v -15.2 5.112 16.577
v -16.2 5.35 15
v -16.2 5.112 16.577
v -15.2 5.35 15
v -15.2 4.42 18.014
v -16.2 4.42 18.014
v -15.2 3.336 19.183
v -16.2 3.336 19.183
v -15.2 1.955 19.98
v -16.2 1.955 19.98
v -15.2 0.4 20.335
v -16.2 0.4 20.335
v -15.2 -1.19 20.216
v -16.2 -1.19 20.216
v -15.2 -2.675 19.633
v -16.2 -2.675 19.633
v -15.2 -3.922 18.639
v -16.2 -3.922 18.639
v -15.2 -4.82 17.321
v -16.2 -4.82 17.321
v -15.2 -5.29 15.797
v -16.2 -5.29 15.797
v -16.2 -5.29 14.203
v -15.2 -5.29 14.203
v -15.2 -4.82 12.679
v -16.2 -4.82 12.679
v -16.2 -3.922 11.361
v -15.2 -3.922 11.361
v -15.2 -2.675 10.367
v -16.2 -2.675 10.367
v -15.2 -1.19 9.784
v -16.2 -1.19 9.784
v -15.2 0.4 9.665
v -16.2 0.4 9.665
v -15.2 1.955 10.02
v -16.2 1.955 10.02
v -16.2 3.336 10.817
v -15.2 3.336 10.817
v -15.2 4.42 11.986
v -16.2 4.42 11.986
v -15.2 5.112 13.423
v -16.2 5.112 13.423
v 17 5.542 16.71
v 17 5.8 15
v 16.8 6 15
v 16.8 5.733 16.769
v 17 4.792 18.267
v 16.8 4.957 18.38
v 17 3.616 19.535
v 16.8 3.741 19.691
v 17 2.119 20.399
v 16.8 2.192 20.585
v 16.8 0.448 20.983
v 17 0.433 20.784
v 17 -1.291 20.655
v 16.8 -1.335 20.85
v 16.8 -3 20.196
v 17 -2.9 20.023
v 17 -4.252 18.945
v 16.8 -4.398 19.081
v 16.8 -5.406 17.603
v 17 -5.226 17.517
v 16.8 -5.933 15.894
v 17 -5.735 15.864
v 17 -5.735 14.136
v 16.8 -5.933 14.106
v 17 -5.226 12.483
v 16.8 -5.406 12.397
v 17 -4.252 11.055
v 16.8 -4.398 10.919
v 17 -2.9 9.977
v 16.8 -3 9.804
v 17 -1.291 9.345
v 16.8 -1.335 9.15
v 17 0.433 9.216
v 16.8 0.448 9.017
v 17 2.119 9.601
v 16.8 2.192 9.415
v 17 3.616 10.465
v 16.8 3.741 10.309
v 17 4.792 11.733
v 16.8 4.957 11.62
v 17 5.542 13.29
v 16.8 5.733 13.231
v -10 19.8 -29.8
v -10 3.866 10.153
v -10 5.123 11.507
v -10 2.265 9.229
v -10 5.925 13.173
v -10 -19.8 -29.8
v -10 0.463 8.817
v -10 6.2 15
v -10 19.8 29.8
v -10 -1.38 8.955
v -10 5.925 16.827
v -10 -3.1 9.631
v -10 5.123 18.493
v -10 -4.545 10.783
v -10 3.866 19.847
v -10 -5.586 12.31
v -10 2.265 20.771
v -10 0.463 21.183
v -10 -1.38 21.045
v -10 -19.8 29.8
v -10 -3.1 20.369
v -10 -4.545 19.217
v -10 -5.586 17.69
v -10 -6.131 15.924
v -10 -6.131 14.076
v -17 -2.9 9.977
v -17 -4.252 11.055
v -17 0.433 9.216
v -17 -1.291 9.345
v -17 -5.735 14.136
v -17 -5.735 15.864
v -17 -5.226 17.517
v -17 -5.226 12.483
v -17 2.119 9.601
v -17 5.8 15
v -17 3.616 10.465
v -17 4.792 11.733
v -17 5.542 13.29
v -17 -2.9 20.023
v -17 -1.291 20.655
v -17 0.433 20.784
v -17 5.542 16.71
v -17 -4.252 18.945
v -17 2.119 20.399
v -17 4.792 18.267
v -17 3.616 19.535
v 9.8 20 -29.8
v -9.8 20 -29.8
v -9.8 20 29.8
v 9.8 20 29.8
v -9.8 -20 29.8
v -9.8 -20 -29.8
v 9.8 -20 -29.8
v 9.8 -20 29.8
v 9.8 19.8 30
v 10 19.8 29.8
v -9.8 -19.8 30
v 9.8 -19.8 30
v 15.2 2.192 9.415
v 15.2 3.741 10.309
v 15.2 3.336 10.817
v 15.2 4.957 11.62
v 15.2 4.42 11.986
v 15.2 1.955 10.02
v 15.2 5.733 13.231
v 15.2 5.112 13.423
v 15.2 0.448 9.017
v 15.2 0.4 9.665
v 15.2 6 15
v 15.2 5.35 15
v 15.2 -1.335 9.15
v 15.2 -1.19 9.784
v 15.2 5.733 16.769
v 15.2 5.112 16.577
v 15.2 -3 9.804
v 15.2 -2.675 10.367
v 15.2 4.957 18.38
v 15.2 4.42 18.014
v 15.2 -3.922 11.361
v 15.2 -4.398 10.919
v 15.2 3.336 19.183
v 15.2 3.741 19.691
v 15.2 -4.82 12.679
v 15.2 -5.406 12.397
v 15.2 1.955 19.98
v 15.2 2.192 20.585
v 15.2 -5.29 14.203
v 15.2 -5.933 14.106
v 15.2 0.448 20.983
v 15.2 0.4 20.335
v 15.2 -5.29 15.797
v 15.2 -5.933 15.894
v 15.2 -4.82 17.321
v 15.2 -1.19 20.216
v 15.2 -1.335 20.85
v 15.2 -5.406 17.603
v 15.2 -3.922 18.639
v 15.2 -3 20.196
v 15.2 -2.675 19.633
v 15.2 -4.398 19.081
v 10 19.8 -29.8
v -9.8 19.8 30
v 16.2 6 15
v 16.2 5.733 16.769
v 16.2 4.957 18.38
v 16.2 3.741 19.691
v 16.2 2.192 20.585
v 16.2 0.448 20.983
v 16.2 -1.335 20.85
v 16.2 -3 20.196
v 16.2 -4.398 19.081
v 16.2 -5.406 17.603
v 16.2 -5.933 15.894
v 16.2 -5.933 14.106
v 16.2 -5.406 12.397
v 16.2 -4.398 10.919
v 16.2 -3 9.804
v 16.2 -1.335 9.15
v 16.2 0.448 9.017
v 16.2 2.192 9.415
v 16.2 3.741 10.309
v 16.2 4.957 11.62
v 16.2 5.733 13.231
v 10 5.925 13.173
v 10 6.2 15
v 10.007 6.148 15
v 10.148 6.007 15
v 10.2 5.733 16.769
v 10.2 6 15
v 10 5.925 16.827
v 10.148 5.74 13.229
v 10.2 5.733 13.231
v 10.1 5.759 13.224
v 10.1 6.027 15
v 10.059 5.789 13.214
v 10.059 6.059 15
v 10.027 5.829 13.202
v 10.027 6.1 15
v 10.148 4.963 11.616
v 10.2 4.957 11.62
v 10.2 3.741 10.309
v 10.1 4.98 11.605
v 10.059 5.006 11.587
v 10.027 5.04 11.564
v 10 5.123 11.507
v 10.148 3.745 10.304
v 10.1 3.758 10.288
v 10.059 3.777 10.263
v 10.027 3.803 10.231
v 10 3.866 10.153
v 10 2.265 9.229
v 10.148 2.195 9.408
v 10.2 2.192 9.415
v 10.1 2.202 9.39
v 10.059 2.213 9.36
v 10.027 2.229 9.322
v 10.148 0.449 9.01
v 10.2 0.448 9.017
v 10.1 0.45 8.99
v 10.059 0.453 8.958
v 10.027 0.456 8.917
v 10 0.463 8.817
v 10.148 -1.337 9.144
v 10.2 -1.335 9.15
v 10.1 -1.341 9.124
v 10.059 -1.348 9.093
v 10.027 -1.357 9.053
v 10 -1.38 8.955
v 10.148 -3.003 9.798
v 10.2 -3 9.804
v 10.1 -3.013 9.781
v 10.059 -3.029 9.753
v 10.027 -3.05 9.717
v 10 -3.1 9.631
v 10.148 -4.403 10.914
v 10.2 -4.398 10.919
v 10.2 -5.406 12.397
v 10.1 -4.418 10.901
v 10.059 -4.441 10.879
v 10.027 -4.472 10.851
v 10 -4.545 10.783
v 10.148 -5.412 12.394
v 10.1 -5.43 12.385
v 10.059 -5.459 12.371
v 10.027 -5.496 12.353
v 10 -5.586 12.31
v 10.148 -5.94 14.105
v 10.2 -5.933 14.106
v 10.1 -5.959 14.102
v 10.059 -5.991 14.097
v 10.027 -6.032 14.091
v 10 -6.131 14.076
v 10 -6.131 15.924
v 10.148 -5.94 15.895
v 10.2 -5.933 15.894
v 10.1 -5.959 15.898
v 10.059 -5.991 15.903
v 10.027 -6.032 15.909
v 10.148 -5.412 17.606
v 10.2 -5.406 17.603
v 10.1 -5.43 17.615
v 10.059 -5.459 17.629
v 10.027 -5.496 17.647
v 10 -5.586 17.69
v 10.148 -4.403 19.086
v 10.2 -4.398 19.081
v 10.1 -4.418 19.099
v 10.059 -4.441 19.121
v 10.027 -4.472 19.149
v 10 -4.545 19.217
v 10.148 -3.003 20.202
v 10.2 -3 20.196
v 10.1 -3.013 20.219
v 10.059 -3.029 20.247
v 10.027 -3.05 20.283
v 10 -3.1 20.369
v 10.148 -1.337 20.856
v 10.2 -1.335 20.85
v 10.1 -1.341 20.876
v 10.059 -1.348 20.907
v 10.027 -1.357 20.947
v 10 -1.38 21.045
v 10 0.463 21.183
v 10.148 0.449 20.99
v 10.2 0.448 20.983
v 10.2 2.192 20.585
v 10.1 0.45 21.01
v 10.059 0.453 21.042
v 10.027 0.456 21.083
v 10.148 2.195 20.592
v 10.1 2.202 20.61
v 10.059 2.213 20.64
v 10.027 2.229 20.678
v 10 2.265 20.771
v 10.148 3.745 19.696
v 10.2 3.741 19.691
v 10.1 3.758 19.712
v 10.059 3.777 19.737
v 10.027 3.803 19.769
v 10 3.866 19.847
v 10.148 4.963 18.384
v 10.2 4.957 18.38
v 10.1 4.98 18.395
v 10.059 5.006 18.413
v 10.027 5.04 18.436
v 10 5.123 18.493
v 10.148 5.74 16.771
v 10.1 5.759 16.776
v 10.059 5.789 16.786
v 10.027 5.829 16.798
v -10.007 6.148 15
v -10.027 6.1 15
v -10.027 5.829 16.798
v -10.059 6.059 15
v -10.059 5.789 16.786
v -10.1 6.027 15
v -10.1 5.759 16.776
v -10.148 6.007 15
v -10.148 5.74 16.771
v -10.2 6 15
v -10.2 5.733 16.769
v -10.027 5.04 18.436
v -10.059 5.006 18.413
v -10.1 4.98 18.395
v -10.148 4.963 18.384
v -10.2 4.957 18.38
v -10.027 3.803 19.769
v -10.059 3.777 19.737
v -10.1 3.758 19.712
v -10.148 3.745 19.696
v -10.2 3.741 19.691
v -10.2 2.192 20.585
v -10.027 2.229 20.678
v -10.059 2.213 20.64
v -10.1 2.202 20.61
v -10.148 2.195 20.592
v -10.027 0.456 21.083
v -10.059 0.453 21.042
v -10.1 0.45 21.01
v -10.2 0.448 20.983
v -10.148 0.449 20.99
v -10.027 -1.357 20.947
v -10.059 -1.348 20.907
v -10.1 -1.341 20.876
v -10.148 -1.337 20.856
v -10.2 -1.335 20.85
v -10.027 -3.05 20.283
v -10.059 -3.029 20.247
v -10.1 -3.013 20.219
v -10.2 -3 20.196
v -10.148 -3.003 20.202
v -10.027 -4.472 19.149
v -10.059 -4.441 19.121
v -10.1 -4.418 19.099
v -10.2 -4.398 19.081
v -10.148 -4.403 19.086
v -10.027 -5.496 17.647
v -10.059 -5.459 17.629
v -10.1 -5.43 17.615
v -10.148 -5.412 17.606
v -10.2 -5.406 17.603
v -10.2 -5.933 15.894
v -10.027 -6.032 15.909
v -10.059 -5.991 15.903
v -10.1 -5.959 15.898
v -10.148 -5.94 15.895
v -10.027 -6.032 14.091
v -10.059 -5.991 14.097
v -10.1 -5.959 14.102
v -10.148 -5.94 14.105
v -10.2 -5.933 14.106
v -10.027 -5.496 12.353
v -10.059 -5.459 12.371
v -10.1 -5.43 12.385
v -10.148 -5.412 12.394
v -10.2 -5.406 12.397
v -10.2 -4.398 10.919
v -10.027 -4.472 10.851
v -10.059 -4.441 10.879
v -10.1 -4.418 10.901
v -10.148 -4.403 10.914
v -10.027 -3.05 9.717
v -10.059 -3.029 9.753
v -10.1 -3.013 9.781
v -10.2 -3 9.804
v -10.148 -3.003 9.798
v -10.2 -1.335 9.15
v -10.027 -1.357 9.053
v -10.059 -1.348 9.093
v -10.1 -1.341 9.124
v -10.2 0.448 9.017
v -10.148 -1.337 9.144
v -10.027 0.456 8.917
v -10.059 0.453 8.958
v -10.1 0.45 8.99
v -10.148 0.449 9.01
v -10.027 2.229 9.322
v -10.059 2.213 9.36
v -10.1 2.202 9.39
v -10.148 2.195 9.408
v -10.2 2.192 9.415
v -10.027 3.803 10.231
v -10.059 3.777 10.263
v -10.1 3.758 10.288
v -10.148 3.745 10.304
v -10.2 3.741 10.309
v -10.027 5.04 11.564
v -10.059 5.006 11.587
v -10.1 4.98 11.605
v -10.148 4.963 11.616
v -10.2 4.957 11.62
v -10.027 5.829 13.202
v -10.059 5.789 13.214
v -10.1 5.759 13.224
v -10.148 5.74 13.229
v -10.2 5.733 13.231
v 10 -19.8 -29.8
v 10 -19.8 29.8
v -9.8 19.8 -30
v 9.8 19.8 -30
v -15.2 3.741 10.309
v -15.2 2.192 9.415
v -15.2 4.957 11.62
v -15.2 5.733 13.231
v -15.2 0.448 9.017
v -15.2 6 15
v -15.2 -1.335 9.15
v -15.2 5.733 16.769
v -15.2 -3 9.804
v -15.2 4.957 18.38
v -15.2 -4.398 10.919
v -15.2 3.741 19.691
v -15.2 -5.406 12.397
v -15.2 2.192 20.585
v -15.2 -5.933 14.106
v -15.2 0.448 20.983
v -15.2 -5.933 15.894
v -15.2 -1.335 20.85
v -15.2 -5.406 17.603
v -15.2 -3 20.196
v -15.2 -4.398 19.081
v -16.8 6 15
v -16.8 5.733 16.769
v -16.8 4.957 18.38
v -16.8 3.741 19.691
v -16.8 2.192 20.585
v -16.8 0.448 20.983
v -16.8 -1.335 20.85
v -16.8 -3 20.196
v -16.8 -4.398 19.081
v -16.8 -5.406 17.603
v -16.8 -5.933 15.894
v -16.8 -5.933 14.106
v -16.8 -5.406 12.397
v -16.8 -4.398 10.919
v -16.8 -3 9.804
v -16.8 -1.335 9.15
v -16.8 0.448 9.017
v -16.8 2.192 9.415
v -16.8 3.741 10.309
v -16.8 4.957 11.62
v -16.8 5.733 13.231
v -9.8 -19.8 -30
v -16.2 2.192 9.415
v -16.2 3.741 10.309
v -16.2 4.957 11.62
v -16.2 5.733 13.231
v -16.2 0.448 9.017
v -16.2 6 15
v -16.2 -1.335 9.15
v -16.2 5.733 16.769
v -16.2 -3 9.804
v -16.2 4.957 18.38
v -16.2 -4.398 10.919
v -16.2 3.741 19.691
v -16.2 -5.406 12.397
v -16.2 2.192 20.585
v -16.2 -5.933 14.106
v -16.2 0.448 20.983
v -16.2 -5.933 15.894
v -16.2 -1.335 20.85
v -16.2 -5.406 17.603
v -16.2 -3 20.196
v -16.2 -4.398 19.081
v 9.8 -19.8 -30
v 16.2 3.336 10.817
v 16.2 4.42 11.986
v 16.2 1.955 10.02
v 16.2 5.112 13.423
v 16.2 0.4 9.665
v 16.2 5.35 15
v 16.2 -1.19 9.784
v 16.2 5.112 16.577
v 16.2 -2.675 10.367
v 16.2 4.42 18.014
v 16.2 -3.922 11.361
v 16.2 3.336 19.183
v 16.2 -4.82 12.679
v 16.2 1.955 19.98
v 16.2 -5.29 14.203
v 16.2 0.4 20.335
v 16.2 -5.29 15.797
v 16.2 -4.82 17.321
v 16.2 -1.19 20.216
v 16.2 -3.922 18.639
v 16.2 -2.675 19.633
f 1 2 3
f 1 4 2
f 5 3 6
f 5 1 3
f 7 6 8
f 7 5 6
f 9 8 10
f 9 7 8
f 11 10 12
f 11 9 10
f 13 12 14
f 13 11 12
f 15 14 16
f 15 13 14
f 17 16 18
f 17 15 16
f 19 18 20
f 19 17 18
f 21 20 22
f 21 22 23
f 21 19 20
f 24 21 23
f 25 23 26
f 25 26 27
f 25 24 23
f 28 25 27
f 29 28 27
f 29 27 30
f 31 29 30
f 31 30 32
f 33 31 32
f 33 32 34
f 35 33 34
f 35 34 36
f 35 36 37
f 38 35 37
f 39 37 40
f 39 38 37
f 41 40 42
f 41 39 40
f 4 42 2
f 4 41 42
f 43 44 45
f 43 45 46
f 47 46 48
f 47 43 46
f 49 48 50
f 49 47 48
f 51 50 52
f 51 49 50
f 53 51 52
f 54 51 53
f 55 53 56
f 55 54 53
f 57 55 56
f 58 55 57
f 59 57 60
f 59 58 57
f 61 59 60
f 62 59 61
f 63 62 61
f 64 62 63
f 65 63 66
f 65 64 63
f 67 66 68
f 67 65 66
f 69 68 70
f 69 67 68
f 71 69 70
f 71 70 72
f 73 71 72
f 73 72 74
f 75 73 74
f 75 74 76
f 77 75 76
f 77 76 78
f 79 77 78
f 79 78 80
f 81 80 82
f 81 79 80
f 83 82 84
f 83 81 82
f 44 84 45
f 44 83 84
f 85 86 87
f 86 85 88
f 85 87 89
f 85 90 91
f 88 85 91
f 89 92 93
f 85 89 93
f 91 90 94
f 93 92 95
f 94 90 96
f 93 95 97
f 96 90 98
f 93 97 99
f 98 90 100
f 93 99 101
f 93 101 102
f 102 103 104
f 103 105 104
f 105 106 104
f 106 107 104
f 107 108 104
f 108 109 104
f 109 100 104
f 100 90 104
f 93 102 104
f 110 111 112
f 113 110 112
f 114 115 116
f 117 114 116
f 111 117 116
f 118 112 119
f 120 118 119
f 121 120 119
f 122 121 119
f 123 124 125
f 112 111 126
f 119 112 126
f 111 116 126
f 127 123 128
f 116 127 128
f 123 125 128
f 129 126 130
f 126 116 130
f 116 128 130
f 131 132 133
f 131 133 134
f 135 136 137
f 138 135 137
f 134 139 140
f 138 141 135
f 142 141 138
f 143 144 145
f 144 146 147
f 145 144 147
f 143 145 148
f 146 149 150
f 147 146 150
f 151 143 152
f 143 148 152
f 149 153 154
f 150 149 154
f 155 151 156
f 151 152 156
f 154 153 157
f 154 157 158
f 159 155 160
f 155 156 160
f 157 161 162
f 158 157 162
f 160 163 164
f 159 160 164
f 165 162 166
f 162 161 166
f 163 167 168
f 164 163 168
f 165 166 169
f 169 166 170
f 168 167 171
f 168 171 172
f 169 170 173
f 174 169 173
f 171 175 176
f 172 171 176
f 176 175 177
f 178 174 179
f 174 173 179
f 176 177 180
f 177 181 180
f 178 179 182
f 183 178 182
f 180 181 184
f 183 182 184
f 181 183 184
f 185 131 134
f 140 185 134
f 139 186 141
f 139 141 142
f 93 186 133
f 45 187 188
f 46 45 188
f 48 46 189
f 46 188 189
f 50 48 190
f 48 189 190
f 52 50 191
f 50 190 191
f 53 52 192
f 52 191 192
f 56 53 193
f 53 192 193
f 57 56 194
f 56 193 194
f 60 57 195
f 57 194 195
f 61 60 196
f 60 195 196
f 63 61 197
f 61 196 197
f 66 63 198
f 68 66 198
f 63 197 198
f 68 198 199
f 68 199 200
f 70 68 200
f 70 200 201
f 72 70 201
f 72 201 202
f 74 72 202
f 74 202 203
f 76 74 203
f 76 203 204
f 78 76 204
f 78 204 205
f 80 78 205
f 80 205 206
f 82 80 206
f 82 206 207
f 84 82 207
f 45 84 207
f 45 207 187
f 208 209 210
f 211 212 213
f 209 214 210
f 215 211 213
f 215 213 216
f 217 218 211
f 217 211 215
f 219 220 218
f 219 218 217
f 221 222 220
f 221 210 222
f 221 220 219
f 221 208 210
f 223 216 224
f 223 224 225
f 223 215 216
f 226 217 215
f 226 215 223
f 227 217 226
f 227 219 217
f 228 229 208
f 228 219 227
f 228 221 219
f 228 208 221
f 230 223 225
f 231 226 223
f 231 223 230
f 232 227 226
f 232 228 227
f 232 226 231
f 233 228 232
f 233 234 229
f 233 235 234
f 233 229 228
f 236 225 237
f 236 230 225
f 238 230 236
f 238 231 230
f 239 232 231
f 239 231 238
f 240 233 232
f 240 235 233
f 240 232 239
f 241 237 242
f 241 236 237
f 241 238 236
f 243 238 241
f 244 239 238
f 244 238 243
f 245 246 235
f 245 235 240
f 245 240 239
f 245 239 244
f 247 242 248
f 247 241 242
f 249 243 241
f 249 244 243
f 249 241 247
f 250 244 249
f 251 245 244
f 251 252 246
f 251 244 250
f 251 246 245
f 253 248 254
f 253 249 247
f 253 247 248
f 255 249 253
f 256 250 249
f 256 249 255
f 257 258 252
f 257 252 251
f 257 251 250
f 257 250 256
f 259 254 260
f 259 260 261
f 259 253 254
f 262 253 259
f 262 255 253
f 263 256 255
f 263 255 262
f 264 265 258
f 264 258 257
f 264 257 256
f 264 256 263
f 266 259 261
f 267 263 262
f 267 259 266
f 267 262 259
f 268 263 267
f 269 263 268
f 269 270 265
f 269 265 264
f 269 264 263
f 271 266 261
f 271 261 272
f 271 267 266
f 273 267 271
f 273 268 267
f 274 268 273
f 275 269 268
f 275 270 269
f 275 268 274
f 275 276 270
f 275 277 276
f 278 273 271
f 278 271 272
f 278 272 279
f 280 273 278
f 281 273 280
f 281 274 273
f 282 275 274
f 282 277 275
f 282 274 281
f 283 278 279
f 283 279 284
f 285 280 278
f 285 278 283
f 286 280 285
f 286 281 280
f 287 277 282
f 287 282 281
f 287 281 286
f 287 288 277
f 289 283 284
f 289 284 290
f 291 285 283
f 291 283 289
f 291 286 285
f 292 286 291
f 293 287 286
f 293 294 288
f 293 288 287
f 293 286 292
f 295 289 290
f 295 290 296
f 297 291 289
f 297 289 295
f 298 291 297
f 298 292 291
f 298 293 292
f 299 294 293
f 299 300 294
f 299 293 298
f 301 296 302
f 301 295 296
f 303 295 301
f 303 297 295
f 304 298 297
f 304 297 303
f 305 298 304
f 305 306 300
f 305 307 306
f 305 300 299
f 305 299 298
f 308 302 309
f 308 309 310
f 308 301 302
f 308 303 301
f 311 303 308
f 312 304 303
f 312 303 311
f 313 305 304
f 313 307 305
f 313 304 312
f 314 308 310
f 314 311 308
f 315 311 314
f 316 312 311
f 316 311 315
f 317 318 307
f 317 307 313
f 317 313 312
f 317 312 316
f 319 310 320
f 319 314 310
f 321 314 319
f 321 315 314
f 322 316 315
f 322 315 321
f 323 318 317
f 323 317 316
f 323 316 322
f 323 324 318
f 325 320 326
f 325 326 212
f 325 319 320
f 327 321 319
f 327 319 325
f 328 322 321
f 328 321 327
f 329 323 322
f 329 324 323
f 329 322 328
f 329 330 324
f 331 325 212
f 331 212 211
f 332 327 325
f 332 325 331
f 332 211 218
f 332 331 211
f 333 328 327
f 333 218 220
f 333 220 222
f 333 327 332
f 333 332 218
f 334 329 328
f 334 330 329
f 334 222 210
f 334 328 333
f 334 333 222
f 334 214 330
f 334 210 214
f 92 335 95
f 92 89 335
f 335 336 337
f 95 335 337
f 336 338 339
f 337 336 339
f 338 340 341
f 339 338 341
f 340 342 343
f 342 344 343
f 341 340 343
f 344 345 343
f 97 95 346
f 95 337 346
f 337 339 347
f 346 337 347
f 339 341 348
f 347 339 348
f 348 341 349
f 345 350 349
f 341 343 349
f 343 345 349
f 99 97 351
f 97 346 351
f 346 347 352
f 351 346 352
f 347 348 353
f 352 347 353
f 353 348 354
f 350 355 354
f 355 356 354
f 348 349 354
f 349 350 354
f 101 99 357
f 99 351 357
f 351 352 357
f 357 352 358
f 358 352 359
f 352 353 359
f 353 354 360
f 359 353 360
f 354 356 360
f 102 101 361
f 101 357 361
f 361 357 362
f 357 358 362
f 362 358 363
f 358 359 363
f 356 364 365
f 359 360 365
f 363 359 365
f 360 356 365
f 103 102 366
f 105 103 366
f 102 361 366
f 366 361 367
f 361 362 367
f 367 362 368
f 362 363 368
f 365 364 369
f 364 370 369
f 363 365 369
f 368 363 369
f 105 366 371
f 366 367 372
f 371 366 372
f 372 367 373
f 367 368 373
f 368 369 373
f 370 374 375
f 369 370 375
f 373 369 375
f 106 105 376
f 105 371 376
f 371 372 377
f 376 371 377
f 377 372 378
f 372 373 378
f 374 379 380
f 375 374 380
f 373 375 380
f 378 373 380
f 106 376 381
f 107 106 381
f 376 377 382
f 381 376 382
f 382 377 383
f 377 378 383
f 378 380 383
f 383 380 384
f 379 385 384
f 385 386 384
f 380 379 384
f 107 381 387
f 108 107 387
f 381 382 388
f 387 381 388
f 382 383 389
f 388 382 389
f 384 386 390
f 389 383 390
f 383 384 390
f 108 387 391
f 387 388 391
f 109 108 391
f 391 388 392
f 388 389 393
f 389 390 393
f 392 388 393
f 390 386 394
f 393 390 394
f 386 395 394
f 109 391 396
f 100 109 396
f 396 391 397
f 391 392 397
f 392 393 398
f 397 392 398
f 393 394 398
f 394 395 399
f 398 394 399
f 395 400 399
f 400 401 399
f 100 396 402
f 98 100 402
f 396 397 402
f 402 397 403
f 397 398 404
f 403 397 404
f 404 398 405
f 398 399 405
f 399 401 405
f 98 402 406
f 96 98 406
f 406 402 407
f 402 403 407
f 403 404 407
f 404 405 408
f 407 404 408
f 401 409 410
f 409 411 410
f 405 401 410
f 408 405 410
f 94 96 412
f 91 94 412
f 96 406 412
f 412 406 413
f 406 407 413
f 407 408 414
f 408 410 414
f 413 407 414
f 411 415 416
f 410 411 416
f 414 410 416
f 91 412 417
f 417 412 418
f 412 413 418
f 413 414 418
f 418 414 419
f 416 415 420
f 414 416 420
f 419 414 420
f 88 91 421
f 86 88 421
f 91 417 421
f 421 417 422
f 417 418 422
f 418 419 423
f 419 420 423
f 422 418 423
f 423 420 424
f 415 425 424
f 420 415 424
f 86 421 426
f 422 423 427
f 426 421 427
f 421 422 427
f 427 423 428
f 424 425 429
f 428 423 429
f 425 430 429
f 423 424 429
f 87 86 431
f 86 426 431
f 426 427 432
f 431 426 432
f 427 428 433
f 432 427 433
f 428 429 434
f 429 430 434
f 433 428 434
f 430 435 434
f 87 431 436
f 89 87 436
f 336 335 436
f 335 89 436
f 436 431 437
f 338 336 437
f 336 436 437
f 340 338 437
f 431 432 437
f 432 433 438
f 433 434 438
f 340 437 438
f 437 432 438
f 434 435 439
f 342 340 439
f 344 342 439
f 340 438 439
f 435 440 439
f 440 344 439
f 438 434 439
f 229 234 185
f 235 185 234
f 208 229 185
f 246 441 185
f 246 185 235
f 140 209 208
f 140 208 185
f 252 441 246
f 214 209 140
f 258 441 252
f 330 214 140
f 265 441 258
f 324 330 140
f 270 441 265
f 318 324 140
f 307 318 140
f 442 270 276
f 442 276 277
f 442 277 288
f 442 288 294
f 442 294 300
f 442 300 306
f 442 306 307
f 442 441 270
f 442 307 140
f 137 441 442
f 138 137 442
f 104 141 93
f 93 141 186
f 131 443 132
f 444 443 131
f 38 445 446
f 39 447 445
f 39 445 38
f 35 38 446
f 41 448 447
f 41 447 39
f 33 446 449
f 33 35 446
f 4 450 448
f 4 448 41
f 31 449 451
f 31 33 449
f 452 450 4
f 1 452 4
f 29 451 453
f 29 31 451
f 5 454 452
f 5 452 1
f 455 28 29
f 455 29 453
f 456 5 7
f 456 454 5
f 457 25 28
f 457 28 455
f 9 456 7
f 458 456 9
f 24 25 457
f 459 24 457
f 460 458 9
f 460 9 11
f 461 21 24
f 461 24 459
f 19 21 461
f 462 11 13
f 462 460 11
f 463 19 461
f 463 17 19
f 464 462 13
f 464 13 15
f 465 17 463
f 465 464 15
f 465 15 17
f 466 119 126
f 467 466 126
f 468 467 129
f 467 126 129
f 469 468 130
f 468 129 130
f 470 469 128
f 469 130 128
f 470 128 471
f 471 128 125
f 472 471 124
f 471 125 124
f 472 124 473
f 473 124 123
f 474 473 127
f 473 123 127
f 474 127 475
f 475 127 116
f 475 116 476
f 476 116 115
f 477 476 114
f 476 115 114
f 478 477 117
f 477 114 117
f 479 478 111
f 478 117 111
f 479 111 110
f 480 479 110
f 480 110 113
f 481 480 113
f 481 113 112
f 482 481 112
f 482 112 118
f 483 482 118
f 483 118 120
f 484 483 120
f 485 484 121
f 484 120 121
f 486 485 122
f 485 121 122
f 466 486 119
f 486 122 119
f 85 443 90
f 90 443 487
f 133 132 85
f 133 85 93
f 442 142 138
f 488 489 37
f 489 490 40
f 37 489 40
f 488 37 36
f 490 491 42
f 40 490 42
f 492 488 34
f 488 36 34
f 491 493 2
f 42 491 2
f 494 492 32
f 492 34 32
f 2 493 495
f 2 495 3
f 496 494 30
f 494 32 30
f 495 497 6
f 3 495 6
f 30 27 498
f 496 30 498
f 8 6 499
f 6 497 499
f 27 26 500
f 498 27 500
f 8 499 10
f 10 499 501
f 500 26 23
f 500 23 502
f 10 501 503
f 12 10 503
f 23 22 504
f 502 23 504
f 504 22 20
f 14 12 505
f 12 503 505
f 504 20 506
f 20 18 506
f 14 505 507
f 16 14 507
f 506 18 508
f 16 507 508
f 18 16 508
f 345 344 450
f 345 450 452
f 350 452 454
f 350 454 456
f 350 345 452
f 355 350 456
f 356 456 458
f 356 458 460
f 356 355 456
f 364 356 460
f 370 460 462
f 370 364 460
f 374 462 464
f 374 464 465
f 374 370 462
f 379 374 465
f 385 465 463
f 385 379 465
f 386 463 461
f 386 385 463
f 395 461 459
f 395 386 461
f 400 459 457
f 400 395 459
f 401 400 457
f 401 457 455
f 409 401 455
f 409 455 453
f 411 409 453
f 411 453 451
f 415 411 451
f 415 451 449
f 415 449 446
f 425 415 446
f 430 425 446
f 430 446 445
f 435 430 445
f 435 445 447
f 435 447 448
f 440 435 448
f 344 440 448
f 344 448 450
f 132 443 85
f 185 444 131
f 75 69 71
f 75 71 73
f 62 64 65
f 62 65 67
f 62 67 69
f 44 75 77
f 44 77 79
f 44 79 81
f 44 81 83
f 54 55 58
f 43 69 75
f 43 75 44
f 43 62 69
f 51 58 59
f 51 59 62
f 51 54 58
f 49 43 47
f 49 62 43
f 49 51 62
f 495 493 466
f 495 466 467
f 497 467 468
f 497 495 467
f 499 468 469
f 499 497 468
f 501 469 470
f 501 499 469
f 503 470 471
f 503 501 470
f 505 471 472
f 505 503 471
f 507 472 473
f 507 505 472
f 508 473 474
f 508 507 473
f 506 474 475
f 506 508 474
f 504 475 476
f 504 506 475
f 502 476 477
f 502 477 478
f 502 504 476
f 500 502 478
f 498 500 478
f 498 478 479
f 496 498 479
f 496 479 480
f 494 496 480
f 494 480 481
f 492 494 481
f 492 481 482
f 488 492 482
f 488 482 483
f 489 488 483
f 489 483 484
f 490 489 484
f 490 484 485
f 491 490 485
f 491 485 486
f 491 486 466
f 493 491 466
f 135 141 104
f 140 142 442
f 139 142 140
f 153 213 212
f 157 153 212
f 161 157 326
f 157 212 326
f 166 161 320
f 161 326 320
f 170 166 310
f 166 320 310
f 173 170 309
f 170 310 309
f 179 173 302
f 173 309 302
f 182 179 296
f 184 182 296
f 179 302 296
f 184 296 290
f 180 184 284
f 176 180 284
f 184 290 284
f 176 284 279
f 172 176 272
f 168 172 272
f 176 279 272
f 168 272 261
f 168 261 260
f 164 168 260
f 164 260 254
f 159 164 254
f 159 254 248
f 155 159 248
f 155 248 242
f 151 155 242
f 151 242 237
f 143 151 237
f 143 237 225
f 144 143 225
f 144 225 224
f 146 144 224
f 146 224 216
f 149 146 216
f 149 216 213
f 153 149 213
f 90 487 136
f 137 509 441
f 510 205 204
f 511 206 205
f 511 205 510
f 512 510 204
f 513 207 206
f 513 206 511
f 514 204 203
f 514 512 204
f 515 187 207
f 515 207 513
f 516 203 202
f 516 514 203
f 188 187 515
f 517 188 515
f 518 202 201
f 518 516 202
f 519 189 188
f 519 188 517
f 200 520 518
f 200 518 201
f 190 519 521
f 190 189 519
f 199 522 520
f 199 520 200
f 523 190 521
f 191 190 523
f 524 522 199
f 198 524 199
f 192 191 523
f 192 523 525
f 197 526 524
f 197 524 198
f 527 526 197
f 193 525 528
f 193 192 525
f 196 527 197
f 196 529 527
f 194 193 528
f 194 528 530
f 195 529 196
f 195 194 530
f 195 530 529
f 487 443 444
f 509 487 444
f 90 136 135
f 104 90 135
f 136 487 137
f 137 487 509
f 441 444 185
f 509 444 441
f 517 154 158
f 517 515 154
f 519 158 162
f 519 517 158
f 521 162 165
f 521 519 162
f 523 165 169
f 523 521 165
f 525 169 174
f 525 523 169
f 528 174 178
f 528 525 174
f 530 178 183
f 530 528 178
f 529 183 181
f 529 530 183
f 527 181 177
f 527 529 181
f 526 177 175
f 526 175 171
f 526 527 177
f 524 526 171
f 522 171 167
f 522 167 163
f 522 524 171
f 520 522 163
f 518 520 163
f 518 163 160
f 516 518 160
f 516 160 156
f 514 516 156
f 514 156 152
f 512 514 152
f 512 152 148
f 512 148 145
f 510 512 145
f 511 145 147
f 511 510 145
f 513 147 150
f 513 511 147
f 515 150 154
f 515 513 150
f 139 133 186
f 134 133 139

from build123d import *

# Parameters (mm, degrees)
F0_W          = 20
F0_H          = 60
F1_DEPTH      = 20
F1_DEPTH_BACK = 20
F2_SIZE       = 0.2
F3_R          = 6
F4_DEPTH      = 17
F4_DEPTH_BACK = 17
F5_R          = 0.2
F6_SIZE       = 0.2
F8_W          = 1
F8_H          = 0.65


with BuildPart() as f1:
    # F0 (on Front) → F1 (new body, two sides)
    with BuildSketch(Plane.XZ) as f1_sk:
        Rectangle(F0_W, F0_H)
    extrude(amount=F1_DEPTH)
    extrude(f1_sk.sketch, amount=-F1_DEPTH_BACK)

    # F2
    f2_edges = [f1.edges().sort_by_distance(p)[0] for p in [
        (10, 0, 30),
        (-10, 0, -30),
        (10, 0, -30),
        (-10, 0, 30),
        (0, 20, 30),
        (0, -20, 30),
        (0, 20, -30),
        (0, -20, -30),
        (-10, 20, 0),
        (-10, -20, 0),
        (10, 20, 0),
        (10, -20, 0),
    ]]
    chamfer(f2_edges, length=F2_SIZE)

    # F3 (on Right) → F4 (join, two sides)
    with BuildSketch(Plane.YZ) as f4_sk:
        with Locations((0, 15)):
            Circle(F3_R)
    extrude(amount=-F4_DEPTH)
    extrude(f4_sk.sketch, amount=F4_DEPTH_BACK)

    # F5
    f5_edges = [f1.edges().sort_by_distance(p)[0] for p in [
        (-10, -6, 15),
        (10, -6, 15),
    ]]
    fillet(f5_edges, radius=F5_R)

    # F6
    f6_edges = [f1.edges().sort_by_distance(p)[0] for p in [
        (17, -6, 15),
        (-17, -6, 15),
    ]]
    chamfer(f6_edges, length=F6_SIZE)

    # F8 (on offset) → F9 (revolve, cut)
    with BuildSketch(Plane.XY.offset(15)):
        with Locations((-15.7, 5.675)):
            Rectangle(F8_W, F8_H)
        with Locations((15.7, 5.675)):
            Rectangle(F8_W, F8_H)
    revolve(axis=Axis((0.9265579283, 0, 15), (1, 0, 0)), mode=Mode.SUBTRACT)


solid = f1.part
